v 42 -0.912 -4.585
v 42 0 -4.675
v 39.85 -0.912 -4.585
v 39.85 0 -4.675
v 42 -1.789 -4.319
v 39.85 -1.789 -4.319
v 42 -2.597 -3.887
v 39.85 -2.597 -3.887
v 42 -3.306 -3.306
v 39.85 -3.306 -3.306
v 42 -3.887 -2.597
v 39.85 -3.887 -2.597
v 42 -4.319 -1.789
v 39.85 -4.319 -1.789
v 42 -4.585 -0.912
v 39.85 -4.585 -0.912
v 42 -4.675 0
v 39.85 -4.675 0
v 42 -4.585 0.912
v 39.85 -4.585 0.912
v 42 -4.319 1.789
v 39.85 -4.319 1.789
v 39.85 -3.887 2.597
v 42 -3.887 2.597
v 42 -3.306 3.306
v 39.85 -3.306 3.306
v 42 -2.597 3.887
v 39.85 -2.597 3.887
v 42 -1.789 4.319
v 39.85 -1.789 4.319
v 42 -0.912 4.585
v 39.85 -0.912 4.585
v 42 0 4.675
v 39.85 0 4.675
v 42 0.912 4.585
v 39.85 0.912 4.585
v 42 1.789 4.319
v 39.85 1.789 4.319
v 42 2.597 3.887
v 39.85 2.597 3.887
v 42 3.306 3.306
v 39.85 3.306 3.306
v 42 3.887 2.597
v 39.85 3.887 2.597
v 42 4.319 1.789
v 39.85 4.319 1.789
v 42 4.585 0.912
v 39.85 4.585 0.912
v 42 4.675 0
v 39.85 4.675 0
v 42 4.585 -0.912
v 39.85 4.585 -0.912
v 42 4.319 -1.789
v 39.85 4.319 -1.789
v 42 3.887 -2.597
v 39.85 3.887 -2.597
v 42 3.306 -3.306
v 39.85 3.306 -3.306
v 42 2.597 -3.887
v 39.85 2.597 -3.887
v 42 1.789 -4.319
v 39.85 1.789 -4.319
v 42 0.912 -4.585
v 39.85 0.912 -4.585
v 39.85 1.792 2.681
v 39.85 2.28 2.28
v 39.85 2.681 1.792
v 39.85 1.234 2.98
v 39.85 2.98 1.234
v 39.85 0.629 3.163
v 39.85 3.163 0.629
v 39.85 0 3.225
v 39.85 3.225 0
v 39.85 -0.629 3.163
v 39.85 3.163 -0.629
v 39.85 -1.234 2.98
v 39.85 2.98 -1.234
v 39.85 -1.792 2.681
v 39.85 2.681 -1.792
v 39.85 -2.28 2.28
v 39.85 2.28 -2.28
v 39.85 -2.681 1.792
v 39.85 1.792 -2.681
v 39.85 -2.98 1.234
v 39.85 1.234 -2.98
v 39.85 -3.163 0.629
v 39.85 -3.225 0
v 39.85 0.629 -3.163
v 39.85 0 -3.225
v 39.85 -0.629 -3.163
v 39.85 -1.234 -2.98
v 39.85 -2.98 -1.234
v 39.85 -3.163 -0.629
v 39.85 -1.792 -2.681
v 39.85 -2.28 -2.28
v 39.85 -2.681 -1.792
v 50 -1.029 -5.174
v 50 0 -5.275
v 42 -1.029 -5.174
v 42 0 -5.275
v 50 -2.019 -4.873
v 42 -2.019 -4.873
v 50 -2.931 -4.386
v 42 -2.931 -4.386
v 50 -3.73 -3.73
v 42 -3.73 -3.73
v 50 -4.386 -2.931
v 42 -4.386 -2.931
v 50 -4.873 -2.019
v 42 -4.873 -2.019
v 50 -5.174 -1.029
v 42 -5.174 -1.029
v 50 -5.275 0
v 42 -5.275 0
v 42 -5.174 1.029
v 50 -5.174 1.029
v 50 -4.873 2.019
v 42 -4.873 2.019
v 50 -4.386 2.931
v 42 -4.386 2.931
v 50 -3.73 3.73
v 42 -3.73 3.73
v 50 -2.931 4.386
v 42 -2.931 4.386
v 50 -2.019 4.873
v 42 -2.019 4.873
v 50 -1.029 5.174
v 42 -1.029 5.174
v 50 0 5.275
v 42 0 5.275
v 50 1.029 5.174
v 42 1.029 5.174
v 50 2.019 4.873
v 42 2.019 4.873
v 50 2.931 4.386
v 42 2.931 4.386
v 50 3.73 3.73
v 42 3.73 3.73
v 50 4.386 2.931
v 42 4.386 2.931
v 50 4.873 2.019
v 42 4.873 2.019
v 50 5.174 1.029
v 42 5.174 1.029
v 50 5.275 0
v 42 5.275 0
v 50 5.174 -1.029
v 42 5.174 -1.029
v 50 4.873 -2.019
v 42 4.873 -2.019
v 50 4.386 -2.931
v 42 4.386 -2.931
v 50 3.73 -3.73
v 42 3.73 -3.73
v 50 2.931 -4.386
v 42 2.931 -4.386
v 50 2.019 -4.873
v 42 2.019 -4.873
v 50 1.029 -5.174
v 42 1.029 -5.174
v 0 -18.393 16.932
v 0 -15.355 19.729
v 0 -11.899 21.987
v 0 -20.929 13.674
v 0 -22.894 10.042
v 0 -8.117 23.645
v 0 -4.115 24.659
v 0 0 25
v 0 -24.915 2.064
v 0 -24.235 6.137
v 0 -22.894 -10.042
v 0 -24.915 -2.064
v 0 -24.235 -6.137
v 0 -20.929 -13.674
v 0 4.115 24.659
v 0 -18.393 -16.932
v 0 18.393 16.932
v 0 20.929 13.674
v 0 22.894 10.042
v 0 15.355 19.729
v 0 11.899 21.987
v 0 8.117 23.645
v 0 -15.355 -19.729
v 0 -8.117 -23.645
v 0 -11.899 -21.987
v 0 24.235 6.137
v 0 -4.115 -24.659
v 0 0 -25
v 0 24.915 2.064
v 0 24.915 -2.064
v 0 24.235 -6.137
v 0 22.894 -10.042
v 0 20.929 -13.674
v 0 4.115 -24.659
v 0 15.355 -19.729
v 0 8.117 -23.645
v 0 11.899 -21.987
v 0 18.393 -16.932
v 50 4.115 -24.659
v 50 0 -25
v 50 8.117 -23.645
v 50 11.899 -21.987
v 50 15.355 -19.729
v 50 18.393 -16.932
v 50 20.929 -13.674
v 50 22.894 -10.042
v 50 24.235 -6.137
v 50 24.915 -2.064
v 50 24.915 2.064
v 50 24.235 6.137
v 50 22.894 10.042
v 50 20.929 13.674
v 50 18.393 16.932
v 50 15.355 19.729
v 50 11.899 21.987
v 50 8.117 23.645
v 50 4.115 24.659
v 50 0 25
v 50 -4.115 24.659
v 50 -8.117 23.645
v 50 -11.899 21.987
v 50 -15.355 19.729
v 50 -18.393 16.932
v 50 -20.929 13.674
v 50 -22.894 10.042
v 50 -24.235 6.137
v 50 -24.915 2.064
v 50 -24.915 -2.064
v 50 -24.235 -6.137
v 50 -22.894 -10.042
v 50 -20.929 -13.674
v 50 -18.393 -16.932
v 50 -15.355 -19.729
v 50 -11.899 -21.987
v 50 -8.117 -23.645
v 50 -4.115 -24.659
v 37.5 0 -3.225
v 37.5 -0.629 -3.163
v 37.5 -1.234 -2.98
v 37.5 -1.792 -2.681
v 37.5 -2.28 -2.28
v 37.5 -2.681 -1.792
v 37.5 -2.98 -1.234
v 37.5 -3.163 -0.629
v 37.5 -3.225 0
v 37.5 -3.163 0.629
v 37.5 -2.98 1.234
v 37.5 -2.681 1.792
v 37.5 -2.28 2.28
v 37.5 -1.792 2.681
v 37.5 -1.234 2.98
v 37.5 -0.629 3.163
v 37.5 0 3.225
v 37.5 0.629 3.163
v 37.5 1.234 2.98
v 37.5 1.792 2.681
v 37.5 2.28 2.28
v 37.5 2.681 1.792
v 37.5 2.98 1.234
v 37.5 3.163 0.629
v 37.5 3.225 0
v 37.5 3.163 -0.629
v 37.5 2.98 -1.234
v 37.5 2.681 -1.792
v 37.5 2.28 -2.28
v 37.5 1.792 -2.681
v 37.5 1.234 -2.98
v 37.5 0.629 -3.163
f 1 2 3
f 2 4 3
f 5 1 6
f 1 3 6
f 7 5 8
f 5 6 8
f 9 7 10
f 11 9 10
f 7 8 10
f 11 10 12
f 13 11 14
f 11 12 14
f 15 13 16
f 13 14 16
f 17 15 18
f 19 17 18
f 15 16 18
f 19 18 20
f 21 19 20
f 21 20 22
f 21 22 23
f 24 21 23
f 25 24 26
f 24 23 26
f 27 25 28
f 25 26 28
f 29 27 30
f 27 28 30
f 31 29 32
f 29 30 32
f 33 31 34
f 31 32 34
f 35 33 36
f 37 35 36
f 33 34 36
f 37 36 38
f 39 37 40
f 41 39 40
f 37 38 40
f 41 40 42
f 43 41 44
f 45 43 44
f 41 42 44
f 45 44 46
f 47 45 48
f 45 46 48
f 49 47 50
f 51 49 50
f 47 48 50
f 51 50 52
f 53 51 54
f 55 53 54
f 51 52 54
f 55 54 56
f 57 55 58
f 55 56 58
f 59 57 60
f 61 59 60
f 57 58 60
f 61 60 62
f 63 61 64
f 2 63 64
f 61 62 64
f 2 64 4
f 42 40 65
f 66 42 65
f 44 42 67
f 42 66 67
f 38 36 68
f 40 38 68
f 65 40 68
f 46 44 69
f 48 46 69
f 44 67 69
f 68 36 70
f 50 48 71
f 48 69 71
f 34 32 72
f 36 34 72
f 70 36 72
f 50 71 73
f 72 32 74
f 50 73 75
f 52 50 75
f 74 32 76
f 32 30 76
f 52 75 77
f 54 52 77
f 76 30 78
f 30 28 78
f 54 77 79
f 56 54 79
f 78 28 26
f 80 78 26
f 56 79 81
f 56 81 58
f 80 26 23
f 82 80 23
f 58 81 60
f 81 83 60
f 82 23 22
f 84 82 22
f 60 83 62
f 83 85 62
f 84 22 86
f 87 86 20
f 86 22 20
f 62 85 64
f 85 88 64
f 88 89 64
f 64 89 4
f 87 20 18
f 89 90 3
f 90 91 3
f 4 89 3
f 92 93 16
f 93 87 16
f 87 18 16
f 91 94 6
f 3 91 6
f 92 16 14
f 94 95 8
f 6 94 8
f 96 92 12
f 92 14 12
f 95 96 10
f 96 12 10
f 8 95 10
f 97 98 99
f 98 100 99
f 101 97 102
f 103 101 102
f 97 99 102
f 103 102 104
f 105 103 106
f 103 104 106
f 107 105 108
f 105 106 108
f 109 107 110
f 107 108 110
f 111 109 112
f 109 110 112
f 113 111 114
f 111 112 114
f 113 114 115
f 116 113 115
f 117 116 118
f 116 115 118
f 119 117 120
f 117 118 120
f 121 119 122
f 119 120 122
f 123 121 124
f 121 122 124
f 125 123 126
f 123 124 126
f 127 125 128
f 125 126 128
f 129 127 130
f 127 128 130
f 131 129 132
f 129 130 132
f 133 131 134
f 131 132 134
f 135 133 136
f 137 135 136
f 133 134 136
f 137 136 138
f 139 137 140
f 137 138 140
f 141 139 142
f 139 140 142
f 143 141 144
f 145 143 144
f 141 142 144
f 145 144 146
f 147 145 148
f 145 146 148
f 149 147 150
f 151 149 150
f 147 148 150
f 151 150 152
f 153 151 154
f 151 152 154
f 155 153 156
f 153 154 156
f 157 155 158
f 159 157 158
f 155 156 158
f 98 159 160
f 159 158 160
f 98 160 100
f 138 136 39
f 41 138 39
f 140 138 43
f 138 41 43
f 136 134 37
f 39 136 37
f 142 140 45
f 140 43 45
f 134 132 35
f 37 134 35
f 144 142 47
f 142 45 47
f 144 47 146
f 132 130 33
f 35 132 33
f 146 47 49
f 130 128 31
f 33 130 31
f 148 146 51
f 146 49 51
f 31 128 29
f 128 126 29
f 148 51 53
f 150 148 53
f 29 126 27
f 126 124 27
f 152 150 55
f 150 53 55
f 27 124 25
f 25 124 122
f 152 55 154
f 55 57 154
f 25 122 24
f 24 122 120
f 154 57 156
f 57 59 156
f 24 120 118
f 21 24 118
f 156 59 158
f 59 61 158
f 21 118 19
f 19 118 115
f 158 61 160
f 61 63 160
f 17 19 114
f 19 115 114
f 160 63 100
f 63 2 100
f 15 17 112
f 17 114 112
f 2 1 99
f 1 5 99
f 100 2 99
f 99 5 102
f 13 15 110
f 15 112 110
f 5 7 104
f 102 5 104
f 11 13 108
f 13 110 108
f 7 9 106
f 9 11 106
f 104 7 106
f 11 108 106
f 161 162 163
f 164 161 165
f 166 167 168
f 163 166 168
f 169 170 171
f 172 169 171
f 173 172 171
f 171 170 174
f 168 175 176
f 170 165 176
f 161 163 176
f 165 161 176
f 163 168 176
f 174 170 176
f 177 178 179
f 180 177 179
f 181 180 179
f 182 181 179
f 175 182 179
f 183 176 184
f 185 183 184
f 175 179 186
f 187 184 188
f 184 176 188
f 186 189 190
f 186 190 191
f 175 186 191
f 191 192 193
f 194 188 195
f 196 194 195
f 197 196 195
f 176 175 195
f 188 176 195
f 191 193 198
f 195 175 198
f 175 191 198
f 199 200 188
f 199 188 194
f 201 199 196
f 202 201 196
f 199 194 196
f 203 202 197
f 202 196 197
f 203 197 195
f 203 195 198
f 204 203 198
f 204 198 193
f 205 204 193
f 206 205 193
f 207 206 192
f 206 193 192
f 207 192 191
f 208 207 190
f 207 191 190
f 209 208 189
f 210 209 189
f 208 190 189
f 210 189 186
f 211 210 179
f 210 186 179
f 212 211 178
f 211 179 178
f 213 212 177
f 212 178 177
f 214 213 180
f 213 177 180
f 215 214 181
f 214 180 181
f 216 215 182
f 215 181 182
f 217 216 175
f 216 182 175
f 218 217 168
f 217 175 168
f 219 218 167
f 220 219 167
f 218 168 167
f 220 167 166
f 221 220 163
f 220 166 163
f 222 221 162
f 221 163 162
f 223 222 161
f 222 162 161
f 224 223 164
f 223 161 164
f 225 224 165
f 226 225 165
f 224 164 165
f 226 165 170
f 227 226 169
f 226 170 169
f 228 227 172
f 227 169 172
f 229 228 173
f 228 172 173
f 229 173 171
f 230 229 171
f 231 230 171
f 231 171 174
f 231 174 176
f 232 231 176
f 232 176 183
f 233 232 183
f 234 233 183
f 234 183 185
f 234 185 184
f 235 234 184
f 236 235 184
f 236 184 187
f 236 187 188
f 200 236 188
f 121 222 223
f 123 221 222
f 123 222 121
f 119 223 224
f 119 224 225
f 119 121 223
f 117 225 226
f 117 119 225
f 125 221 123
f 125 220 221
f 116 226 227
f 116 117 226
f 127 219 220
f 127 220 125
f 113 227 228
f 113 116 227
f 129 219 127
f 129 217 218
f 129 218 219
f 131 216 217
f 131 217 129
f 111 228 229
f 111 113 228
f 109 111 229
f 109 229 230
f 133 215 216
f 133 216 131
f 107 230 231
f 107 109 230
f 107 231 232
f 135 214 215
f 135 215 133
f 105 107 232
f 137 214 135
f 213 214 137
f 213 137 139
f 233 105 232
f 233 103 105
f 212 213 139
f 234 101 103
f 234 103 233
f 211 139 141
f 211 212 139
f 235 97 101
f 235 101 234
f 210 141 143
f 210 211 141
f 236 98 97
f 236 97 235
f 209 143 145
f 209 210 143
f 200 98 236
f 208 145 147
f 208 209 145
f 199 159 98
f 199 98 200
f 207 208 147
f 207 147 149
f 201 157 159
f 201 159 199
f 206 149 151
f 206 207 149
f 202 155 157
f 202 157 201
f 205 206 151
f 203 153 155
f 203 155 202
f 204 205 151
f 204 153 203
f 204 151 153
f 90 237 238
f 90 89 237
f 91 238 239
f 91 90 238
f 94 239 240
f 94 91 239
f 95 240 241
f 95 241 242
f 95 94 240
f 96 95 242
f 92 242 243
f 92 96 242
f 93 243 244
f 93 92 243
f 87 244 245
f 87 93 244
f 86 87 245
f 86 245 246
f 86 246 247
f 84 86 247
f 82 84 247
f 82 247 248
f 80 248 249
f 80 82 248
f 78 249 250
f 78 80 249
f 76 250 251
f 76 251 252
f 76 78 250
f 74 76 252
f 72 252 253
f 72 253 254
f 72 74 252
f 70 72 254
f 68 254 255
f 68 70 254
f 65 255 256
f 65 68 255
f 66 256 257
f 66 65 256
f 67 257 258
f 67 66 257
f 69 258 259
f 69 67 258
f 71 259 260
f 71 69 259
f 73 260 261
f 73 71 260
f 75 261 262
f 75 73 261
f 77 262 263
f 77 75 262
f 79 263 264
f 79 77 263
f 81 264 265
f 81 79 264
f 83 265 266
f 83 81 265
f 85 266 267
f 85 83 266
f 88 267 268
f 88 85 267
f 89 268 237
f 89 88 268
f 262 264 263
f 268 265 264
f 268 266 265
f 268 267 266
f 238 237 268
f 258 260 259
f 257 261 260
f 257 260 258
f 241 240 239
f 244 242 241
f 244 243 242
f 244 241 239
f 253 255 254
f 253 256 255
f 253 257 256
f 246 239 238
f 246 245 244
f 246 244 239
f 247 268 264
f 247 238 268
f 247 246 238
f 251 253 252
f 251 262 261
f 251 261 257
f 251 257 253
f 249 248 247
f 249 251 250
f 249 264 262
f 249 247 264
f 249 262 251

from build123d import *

# Parameters (mm, degrees)
SKETCH1_R           = 25
BOSS_EXTRUDE1_DEPTH = 50
SKETCH2_W           = 2.35
SKETCH2_H           = 3.225


with BuildPart() as part:
    # Sketch1 → Boss-Extrude1 (new body)
    with BuildSketch(Plane(origin=(0, 0, 0), x_dir=(0, 0, -1), z_dir=(1, 0, 0))):
        Circle(SKETCH1_R)
    extrude(amount=BOSS_EXTRUDE1_DEPTH)

    # Sketch2 → Cut-Revolve3 (revolve, cut)
    with BuildSketch(Plane(origin=(0, 0, 0), x_dir=(1, 0, 0), z_dir=(0, 1, 0))):
        Polygon((42, 0), (50, 0), (50, 5.275), (42, 5.275), (42, 4.675), align=None)
        Polygon((39.85, 0), (42, 0), (42, 4.675), (39.85, 4.675), (39.85, 3.225), align=None)
        with Locations((38.675, 1.6125)):
            Rectangle(SKETCH2_W, SKETCH2_H)
    revolve(axis=Axis((50, 0, 0), (-1, 0, 0)), mode=Mode.SUBTRACT)


solid = part.part
